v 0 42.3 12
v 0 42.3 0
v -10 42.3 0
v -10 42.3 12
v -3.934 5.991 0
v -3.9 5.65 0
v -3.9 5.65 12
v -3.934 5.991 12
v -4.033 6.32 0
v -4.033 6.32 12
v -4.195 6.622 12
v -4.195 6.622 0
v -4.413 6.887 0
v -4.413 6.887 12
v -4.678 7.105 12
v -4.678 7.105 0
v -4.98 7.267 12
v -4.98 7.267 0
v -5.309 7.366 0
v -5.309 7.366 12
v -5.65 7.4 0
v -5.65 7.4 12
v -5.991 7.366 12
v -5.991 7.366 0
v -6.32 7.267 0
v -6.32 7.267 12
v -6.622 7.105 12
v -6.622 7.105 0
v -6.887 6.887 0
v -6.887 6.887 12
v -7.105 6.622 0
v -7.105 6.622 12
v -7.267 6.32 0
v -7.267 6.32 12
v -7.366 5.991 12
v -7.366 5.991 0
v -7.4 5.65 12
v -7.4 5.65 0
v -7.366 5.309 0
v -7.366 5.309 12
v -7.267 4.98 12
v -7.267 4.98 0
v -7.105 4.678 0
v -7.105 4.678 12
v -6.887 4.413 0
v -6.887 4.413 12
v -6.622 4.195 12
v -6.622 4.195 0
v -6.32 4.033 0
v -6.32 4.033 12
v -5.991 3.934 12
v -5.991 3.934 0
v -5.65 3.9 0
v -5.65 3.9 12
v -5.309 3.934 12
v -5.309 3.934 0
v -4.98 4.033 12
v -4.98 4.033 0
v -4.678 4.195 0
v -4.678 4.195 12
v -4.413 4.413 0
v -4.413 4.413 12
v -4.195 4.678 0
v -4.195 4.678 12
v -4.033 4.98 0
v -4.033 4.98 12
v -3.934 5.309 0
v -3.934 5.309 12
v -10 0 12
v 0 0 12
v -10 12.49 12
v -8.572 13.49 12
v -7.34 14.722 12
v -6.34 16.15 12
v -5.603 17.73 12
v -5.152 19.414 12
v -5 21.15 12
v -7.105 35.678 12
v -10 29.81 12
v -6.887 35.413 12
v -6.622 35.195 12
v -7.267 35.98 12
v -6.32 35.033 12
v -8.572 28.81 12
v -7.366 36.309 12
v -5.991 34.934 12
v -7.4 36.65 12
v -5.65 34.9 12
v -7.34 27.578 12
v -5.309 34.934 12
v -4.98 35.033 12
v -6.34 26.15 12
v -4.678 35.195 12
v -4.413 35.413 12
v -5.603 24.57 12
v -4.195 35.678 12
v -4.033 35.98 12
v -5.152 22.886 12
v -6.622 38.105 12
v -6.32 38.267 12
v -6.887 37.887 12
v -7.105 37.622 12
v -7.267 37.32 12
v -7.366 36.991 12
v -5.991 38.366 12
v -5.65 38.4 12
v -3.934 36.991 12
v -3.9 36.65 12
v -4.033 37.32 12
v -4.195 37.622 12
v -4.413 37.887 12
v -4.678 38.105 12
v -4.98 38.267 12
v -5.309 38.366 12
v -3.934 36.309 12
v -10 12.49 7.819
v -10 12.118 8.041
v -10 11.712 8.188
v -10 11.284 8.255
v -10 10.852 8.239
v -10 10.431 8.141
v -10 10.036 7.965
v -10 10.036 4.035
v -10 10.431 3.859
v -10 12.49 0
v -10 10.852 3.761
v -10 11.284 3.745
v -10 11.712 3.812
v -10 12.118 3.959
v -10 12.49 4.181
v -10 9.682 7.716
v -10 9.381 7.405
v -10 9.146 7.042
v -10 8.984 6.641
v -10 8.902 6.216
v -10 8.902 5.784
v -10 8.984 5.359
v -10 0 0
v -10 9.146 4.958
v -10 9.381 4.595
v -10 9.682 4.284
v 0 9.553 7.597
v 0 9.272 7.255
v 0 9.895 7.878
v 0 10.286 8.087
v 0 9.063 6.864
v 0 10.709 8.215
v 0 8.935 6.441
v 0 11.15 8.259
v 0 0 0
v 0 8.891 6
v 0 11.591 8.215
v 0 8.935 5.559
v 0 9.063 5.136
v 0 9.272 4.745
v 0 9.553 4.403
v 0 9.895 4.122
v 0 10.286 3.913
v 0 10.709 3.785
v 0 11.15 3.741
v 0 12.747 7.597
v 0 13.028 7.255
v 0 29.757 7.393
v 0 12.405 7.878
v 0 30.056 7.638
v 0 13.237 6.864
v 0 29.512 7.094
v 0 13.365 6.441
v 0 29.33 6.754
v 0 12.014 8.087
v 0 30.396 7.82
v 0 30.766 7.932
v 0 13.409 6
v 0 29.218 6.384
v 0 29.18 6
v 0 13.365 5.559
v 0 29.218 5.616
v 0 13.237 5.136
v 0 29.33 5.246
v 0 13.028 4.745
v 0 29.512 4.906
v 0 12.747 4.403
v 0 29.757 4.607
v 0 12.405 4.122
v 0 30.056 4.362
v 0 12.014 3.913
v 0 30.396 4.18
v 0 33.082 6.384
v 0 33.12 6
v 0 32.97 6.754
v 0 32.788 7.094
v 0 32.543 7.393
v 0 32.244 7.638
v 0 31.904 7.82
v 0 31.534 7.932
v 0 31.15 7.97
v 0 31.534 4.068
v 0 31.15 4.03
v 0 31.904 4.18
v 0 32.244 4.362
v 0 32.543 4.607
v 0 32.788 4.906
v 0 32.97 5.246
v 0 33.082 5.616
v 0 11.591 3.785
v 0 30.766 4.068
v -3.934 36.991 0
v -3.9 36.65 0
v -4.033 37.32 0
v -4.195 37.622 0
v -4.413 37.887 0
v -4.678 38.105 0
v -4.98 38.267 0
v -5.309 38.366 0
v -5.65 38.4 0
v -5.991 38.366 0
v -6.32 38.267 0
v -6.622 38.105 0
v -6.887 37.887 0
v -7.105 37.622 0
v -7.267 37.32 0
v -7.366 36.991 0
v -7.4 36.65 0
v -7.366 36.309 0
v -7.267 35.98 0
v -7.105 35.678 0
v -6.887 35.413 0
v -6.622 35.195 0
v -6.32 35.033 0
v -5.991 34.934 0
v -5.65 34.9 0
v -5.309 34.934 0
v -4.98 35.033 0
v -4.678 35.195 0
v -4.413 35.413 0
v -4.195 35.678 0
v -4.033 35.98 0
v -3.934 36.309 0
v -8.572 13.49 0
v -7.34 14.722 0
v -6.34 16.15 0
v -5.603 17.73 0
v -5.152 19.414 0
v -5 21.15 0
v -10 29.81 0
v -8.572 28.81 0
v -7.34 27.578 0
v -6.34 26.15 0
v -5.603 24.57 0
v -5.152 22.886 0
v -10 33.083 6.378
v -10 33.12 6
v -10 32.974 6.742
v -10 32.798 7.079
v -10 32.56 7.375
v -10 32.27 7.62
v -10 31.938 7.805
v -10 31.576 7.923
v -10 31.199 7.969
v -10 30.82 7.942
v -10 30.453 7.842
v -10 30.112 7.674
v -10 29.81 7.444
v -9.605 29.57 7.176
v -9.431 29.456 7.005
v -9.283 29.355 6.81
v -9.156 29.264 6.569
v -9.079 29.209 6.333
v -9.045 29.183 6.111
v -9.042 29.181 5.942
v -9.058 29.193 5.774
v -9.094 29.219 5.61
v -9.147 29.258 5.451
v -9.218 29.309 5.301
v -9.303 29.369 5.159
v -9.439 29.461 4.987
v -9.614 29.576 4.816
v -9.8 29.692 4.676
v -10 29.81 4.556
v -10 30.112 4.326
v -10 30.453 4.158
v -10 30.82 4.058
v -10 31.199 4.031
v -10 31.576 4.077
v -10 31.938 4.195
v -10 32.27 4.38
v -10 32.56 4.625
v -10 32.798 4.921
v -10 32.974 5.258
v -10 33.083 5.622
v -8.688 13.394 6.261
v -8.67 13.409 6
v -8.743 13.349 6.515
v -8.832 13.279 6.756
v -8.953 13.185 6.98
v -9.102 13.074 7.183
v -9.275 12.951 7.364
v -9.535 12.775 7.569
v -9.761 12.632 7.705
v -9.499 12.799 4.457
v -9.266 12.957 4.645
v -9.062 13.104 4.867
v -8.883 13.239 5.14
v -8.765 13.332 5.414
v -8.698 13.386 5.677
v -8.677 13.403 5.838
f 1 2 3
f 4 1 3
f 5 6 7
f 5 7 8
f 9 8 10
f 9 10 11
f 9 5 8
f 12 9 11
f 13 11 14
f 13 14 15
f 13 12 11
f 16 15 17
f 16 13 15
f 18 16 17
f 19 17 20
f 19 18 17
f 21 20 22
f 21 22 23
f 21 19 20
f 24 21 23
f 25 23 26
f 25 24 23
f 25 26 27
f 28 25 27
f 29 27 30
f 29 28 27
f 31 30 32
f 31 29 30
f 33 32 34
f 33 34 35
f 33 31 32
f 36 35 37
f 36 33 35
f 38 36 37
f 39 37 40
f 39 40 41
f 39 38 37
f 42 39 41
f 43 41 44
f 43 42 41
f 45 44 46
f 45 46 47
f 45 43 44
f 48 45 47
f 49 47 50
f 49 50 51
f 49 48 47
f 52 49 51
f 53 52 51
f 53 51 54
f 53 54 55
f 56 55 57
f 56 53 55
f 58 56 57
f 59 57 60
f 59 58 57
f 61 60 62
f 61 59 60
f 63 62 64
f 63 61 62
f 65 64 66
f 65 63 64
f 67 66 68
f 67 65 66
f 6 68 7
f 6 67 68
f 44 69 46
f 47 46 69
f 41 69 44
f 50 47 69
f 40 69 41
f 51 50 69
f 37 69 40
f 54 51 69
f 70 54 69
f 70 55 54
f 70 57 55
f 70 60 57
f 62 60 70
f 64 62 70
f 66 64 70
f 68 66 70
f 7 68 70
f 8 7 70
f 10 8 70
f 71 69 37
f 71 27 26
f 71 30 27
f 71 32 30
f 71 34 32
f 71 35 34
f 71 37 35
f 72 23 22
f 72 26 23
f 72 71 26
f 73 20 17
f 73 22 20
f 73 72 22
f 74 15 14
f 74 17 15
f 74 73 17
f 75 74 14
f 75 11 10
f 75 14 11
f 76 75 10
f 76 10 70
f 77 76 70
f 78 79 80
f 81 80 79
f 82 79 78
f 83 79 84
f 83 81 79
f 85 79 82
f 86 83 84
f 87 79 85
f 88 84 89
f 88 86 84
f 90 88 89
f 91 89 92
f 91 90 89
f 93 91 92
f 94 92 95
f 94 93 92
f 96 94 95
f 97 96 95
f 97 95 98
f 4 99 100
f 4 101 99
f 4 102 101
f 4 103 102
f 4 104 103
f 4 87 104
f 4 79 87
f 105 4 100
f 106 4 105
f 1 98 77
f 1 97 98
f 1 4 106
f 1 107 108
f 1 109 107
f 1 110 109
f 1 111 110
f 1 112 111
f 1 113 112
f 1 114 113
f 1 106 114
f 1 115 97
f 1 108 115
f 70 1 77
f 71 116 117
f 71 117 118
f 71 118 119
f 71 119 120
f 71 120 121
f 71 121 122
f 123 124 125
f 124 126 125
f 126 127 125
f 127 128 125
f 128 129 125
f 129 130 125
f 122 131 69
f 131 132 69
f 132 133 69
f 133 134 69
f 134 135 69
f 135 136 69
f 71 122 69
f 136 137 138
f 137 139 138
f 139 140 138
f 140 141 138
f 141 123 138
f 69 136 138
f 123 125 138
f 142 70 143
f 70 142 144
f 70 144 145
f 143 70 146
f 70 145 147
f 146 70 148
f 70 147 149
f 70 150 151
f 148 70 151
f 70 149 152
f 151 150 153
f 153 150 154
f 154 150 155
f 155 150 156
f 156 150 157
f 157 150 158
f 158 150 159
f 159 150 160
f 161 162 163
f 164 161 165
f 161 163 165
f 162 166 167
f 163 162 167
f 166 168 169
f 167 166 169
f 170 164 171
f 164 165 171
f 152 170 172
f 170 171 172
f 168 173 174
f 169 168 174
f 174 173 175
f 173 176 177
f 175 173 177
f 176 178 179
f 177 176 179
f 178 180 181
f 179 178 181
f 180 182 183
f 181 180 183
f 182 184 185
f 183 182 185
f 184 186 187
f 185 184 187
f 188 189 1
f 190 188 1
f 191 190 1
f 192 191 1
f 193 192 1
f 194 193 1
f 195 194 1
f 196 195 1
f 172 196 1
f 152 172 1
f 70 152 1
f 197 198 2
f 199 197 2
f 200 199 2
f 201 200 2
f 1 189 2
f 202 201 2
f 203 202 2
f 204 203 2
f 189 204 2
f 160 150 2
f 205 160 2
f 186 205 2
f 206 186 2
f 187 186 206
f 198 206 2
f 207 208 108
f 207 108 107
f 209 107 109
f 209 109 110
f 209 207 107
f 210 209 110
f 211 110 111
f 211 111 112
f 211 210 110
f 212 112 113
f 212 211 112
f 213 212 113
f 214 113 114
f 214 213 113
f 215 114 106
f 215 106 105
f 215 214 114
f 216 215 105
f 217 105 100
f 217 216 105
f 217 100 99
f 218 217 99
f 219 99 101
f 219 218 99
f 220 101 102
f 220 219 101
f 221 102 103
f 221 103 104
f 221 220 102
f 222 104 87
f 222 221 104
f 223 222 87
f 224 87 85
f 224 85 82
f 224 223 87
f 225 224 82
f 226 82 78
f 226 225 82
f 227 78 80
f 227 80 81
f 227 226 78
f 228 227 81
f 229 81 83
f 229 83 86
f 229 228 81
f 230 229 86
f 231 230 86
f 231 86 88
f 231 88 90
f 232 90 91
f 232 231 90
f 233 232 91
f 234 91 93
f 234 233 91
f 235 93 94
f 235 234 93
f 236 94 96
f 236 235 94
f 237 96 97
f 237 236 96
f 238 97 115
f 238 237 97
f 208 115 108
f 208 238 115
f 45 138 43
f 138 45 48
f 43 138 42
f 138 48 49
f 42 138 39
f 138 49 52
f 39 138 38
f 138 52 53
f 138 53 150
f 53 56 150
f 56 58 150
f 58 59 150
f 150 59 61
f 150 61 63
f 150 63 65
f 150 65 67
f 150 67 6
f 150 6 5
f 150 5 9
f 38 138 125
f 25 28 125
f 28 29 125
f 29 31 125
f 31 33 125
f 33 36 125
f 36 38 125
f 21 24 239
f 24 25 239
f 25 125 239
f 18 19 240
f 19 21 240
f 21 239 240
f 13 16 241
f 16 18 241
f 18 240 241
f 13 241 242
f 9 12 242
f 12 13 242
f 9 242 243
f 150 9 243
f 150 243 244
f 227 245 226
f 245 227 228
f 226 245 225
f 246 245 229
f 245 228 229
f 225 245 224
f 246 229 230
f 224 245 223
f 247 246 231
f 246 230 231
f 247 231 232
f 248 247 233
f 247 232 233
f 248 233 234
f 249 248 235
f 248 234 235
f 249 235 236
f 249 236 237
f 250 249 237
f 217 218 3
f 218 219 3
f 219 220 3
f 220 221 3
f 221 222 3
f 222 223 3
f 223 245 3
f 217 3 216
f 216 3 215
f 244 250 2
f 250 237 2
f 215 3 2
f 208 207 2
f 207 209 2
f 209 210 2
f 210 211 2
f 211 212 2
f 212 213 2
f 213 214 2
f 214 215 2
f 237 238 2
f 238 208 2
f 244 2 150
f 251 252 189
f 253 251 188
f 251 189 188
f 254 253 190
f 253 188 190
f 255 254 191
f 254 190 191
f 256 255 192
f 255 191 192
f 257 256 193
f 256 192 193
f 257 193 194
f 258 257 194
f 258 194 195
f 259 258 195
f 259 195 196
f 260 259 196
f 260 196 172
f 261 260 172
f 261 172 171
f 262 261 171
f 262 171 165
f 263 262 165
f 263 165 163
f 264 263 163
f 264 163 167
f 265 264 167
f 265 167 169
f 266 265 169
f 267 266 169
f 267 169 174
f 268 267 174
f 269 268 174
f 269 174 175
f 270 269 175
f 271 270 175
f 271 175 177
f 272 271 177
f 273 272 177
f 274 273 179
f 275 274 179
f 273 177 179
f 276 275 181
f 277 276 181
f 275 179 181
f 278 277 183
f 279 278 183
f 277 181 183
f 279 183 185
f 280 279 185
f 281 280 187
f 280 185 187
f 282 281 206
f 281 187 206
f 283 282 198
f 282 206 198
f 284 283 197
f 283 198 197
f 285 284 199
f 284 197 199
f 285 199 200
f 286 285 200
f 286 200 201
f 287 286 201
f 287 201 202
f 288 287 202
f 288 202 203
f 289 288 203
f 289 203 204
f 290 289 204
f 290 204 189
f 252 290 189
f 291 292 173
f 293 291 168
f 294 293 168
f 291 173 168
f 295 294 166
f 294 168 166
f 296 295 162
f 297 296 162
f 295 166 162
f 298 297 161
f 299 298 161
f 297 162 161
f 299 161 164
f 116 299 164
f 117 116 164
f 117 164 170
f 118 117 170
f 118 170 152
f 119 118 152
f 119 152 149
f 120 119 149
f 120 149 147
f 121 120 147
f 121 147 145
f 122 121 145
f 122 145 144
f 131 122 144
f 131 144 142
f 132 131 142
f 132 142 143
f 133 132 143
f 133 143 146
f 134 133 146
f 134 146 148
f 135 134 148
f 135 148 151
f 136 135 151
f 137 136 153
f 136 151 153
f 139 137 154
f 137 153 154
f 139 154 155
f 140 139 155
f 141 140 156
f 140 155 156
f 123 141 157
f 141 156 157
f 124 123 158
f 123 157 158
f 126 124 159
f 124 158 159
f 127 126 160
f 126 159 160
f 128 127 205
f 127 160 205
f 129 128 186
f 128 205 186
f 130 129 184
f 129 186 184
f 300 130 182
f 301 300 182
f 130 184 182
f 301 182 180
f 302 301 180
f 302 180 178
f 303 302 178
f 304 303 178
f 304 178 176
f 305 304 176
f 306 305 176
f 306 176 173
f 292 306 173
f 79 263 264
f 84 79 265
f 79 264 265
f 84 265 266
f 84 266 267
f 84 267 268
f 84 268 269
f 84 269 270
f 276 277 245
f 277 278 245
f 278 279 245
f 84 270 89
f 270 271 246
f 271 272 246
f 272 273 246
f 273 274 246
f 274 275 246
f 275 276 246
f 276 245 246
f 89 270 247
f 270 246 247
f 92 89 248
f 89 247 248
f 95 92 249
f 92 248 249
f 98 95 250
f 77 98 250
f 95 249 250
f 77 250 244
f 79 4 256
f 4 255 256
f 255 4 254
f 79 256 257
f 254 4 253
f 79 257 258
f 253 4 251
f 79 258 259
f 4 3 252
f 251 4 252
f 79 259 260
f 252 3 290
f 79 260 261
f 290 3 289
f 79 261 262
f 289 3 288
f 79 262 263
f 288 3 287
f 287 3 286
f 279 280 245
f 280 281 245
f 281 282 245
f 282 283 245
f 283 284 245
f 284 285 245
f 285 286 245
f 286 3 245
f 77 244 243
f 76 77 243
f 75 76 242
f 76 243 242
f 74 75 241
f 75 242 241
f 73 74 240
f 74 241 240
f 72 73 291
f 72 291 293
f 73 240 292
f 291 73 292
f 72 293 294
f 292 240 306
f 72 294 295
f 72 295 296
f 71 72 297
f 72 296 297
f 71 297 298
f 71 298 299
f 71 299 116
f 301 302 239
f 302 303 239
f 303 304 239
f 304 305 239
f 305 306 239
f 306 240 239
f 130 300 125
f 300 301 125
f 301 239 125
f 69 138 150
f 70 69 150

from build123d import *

# Parameters (mm, degrees)
F0_R     = 1.75
F1_DEPTH = 12
F2_R     = 1.96967
F2_R_2   = 2.258854
F3_DEPTH = 25


with BuildPart() as f1:
    # F0 (on Top) → F1 (new body)
    with BuildSketch(Plane.XY):
        with BuildLine():
            ThreePointArc((-10, 29.810254), (-6.339746, 26.15), (-5, 21.15))
            ThreePointArc((-5, 21.15), (-6.339746, 16.15), (-10, 12.489746))
            Line((-10, 12.489746), (-10, 0))
            Line((-10, 0), (0, 0))
            Line((0, 0), (0, 42.3))
            Line((0, 42.3), (-10, 42.3))
            Line((-10, 42.3), (-10, 29.810254))
        make_face()
        with Locations((-5.65, 5.65)):
            Circle(F0_R, mode=Mode.SUBTRACT)
        with Locations((-5.65, 36.65)):
            Circle(F0_R, mode=Mode.SUBTRACT)
    extrude(amount=F1_DEPTH)

    # F2 (on face) → F3 (cut)
    with BuildSketch(Plane.YZ):
        with Locations((31.15, 6)):
            Circle(F2_R)
        with Locations((11.15, 6)):
            Circle(F2_R_2)
    extrude(amount=-F3_DEPTH, mode=Mode.SUBTRACT)


solid = f1.part
